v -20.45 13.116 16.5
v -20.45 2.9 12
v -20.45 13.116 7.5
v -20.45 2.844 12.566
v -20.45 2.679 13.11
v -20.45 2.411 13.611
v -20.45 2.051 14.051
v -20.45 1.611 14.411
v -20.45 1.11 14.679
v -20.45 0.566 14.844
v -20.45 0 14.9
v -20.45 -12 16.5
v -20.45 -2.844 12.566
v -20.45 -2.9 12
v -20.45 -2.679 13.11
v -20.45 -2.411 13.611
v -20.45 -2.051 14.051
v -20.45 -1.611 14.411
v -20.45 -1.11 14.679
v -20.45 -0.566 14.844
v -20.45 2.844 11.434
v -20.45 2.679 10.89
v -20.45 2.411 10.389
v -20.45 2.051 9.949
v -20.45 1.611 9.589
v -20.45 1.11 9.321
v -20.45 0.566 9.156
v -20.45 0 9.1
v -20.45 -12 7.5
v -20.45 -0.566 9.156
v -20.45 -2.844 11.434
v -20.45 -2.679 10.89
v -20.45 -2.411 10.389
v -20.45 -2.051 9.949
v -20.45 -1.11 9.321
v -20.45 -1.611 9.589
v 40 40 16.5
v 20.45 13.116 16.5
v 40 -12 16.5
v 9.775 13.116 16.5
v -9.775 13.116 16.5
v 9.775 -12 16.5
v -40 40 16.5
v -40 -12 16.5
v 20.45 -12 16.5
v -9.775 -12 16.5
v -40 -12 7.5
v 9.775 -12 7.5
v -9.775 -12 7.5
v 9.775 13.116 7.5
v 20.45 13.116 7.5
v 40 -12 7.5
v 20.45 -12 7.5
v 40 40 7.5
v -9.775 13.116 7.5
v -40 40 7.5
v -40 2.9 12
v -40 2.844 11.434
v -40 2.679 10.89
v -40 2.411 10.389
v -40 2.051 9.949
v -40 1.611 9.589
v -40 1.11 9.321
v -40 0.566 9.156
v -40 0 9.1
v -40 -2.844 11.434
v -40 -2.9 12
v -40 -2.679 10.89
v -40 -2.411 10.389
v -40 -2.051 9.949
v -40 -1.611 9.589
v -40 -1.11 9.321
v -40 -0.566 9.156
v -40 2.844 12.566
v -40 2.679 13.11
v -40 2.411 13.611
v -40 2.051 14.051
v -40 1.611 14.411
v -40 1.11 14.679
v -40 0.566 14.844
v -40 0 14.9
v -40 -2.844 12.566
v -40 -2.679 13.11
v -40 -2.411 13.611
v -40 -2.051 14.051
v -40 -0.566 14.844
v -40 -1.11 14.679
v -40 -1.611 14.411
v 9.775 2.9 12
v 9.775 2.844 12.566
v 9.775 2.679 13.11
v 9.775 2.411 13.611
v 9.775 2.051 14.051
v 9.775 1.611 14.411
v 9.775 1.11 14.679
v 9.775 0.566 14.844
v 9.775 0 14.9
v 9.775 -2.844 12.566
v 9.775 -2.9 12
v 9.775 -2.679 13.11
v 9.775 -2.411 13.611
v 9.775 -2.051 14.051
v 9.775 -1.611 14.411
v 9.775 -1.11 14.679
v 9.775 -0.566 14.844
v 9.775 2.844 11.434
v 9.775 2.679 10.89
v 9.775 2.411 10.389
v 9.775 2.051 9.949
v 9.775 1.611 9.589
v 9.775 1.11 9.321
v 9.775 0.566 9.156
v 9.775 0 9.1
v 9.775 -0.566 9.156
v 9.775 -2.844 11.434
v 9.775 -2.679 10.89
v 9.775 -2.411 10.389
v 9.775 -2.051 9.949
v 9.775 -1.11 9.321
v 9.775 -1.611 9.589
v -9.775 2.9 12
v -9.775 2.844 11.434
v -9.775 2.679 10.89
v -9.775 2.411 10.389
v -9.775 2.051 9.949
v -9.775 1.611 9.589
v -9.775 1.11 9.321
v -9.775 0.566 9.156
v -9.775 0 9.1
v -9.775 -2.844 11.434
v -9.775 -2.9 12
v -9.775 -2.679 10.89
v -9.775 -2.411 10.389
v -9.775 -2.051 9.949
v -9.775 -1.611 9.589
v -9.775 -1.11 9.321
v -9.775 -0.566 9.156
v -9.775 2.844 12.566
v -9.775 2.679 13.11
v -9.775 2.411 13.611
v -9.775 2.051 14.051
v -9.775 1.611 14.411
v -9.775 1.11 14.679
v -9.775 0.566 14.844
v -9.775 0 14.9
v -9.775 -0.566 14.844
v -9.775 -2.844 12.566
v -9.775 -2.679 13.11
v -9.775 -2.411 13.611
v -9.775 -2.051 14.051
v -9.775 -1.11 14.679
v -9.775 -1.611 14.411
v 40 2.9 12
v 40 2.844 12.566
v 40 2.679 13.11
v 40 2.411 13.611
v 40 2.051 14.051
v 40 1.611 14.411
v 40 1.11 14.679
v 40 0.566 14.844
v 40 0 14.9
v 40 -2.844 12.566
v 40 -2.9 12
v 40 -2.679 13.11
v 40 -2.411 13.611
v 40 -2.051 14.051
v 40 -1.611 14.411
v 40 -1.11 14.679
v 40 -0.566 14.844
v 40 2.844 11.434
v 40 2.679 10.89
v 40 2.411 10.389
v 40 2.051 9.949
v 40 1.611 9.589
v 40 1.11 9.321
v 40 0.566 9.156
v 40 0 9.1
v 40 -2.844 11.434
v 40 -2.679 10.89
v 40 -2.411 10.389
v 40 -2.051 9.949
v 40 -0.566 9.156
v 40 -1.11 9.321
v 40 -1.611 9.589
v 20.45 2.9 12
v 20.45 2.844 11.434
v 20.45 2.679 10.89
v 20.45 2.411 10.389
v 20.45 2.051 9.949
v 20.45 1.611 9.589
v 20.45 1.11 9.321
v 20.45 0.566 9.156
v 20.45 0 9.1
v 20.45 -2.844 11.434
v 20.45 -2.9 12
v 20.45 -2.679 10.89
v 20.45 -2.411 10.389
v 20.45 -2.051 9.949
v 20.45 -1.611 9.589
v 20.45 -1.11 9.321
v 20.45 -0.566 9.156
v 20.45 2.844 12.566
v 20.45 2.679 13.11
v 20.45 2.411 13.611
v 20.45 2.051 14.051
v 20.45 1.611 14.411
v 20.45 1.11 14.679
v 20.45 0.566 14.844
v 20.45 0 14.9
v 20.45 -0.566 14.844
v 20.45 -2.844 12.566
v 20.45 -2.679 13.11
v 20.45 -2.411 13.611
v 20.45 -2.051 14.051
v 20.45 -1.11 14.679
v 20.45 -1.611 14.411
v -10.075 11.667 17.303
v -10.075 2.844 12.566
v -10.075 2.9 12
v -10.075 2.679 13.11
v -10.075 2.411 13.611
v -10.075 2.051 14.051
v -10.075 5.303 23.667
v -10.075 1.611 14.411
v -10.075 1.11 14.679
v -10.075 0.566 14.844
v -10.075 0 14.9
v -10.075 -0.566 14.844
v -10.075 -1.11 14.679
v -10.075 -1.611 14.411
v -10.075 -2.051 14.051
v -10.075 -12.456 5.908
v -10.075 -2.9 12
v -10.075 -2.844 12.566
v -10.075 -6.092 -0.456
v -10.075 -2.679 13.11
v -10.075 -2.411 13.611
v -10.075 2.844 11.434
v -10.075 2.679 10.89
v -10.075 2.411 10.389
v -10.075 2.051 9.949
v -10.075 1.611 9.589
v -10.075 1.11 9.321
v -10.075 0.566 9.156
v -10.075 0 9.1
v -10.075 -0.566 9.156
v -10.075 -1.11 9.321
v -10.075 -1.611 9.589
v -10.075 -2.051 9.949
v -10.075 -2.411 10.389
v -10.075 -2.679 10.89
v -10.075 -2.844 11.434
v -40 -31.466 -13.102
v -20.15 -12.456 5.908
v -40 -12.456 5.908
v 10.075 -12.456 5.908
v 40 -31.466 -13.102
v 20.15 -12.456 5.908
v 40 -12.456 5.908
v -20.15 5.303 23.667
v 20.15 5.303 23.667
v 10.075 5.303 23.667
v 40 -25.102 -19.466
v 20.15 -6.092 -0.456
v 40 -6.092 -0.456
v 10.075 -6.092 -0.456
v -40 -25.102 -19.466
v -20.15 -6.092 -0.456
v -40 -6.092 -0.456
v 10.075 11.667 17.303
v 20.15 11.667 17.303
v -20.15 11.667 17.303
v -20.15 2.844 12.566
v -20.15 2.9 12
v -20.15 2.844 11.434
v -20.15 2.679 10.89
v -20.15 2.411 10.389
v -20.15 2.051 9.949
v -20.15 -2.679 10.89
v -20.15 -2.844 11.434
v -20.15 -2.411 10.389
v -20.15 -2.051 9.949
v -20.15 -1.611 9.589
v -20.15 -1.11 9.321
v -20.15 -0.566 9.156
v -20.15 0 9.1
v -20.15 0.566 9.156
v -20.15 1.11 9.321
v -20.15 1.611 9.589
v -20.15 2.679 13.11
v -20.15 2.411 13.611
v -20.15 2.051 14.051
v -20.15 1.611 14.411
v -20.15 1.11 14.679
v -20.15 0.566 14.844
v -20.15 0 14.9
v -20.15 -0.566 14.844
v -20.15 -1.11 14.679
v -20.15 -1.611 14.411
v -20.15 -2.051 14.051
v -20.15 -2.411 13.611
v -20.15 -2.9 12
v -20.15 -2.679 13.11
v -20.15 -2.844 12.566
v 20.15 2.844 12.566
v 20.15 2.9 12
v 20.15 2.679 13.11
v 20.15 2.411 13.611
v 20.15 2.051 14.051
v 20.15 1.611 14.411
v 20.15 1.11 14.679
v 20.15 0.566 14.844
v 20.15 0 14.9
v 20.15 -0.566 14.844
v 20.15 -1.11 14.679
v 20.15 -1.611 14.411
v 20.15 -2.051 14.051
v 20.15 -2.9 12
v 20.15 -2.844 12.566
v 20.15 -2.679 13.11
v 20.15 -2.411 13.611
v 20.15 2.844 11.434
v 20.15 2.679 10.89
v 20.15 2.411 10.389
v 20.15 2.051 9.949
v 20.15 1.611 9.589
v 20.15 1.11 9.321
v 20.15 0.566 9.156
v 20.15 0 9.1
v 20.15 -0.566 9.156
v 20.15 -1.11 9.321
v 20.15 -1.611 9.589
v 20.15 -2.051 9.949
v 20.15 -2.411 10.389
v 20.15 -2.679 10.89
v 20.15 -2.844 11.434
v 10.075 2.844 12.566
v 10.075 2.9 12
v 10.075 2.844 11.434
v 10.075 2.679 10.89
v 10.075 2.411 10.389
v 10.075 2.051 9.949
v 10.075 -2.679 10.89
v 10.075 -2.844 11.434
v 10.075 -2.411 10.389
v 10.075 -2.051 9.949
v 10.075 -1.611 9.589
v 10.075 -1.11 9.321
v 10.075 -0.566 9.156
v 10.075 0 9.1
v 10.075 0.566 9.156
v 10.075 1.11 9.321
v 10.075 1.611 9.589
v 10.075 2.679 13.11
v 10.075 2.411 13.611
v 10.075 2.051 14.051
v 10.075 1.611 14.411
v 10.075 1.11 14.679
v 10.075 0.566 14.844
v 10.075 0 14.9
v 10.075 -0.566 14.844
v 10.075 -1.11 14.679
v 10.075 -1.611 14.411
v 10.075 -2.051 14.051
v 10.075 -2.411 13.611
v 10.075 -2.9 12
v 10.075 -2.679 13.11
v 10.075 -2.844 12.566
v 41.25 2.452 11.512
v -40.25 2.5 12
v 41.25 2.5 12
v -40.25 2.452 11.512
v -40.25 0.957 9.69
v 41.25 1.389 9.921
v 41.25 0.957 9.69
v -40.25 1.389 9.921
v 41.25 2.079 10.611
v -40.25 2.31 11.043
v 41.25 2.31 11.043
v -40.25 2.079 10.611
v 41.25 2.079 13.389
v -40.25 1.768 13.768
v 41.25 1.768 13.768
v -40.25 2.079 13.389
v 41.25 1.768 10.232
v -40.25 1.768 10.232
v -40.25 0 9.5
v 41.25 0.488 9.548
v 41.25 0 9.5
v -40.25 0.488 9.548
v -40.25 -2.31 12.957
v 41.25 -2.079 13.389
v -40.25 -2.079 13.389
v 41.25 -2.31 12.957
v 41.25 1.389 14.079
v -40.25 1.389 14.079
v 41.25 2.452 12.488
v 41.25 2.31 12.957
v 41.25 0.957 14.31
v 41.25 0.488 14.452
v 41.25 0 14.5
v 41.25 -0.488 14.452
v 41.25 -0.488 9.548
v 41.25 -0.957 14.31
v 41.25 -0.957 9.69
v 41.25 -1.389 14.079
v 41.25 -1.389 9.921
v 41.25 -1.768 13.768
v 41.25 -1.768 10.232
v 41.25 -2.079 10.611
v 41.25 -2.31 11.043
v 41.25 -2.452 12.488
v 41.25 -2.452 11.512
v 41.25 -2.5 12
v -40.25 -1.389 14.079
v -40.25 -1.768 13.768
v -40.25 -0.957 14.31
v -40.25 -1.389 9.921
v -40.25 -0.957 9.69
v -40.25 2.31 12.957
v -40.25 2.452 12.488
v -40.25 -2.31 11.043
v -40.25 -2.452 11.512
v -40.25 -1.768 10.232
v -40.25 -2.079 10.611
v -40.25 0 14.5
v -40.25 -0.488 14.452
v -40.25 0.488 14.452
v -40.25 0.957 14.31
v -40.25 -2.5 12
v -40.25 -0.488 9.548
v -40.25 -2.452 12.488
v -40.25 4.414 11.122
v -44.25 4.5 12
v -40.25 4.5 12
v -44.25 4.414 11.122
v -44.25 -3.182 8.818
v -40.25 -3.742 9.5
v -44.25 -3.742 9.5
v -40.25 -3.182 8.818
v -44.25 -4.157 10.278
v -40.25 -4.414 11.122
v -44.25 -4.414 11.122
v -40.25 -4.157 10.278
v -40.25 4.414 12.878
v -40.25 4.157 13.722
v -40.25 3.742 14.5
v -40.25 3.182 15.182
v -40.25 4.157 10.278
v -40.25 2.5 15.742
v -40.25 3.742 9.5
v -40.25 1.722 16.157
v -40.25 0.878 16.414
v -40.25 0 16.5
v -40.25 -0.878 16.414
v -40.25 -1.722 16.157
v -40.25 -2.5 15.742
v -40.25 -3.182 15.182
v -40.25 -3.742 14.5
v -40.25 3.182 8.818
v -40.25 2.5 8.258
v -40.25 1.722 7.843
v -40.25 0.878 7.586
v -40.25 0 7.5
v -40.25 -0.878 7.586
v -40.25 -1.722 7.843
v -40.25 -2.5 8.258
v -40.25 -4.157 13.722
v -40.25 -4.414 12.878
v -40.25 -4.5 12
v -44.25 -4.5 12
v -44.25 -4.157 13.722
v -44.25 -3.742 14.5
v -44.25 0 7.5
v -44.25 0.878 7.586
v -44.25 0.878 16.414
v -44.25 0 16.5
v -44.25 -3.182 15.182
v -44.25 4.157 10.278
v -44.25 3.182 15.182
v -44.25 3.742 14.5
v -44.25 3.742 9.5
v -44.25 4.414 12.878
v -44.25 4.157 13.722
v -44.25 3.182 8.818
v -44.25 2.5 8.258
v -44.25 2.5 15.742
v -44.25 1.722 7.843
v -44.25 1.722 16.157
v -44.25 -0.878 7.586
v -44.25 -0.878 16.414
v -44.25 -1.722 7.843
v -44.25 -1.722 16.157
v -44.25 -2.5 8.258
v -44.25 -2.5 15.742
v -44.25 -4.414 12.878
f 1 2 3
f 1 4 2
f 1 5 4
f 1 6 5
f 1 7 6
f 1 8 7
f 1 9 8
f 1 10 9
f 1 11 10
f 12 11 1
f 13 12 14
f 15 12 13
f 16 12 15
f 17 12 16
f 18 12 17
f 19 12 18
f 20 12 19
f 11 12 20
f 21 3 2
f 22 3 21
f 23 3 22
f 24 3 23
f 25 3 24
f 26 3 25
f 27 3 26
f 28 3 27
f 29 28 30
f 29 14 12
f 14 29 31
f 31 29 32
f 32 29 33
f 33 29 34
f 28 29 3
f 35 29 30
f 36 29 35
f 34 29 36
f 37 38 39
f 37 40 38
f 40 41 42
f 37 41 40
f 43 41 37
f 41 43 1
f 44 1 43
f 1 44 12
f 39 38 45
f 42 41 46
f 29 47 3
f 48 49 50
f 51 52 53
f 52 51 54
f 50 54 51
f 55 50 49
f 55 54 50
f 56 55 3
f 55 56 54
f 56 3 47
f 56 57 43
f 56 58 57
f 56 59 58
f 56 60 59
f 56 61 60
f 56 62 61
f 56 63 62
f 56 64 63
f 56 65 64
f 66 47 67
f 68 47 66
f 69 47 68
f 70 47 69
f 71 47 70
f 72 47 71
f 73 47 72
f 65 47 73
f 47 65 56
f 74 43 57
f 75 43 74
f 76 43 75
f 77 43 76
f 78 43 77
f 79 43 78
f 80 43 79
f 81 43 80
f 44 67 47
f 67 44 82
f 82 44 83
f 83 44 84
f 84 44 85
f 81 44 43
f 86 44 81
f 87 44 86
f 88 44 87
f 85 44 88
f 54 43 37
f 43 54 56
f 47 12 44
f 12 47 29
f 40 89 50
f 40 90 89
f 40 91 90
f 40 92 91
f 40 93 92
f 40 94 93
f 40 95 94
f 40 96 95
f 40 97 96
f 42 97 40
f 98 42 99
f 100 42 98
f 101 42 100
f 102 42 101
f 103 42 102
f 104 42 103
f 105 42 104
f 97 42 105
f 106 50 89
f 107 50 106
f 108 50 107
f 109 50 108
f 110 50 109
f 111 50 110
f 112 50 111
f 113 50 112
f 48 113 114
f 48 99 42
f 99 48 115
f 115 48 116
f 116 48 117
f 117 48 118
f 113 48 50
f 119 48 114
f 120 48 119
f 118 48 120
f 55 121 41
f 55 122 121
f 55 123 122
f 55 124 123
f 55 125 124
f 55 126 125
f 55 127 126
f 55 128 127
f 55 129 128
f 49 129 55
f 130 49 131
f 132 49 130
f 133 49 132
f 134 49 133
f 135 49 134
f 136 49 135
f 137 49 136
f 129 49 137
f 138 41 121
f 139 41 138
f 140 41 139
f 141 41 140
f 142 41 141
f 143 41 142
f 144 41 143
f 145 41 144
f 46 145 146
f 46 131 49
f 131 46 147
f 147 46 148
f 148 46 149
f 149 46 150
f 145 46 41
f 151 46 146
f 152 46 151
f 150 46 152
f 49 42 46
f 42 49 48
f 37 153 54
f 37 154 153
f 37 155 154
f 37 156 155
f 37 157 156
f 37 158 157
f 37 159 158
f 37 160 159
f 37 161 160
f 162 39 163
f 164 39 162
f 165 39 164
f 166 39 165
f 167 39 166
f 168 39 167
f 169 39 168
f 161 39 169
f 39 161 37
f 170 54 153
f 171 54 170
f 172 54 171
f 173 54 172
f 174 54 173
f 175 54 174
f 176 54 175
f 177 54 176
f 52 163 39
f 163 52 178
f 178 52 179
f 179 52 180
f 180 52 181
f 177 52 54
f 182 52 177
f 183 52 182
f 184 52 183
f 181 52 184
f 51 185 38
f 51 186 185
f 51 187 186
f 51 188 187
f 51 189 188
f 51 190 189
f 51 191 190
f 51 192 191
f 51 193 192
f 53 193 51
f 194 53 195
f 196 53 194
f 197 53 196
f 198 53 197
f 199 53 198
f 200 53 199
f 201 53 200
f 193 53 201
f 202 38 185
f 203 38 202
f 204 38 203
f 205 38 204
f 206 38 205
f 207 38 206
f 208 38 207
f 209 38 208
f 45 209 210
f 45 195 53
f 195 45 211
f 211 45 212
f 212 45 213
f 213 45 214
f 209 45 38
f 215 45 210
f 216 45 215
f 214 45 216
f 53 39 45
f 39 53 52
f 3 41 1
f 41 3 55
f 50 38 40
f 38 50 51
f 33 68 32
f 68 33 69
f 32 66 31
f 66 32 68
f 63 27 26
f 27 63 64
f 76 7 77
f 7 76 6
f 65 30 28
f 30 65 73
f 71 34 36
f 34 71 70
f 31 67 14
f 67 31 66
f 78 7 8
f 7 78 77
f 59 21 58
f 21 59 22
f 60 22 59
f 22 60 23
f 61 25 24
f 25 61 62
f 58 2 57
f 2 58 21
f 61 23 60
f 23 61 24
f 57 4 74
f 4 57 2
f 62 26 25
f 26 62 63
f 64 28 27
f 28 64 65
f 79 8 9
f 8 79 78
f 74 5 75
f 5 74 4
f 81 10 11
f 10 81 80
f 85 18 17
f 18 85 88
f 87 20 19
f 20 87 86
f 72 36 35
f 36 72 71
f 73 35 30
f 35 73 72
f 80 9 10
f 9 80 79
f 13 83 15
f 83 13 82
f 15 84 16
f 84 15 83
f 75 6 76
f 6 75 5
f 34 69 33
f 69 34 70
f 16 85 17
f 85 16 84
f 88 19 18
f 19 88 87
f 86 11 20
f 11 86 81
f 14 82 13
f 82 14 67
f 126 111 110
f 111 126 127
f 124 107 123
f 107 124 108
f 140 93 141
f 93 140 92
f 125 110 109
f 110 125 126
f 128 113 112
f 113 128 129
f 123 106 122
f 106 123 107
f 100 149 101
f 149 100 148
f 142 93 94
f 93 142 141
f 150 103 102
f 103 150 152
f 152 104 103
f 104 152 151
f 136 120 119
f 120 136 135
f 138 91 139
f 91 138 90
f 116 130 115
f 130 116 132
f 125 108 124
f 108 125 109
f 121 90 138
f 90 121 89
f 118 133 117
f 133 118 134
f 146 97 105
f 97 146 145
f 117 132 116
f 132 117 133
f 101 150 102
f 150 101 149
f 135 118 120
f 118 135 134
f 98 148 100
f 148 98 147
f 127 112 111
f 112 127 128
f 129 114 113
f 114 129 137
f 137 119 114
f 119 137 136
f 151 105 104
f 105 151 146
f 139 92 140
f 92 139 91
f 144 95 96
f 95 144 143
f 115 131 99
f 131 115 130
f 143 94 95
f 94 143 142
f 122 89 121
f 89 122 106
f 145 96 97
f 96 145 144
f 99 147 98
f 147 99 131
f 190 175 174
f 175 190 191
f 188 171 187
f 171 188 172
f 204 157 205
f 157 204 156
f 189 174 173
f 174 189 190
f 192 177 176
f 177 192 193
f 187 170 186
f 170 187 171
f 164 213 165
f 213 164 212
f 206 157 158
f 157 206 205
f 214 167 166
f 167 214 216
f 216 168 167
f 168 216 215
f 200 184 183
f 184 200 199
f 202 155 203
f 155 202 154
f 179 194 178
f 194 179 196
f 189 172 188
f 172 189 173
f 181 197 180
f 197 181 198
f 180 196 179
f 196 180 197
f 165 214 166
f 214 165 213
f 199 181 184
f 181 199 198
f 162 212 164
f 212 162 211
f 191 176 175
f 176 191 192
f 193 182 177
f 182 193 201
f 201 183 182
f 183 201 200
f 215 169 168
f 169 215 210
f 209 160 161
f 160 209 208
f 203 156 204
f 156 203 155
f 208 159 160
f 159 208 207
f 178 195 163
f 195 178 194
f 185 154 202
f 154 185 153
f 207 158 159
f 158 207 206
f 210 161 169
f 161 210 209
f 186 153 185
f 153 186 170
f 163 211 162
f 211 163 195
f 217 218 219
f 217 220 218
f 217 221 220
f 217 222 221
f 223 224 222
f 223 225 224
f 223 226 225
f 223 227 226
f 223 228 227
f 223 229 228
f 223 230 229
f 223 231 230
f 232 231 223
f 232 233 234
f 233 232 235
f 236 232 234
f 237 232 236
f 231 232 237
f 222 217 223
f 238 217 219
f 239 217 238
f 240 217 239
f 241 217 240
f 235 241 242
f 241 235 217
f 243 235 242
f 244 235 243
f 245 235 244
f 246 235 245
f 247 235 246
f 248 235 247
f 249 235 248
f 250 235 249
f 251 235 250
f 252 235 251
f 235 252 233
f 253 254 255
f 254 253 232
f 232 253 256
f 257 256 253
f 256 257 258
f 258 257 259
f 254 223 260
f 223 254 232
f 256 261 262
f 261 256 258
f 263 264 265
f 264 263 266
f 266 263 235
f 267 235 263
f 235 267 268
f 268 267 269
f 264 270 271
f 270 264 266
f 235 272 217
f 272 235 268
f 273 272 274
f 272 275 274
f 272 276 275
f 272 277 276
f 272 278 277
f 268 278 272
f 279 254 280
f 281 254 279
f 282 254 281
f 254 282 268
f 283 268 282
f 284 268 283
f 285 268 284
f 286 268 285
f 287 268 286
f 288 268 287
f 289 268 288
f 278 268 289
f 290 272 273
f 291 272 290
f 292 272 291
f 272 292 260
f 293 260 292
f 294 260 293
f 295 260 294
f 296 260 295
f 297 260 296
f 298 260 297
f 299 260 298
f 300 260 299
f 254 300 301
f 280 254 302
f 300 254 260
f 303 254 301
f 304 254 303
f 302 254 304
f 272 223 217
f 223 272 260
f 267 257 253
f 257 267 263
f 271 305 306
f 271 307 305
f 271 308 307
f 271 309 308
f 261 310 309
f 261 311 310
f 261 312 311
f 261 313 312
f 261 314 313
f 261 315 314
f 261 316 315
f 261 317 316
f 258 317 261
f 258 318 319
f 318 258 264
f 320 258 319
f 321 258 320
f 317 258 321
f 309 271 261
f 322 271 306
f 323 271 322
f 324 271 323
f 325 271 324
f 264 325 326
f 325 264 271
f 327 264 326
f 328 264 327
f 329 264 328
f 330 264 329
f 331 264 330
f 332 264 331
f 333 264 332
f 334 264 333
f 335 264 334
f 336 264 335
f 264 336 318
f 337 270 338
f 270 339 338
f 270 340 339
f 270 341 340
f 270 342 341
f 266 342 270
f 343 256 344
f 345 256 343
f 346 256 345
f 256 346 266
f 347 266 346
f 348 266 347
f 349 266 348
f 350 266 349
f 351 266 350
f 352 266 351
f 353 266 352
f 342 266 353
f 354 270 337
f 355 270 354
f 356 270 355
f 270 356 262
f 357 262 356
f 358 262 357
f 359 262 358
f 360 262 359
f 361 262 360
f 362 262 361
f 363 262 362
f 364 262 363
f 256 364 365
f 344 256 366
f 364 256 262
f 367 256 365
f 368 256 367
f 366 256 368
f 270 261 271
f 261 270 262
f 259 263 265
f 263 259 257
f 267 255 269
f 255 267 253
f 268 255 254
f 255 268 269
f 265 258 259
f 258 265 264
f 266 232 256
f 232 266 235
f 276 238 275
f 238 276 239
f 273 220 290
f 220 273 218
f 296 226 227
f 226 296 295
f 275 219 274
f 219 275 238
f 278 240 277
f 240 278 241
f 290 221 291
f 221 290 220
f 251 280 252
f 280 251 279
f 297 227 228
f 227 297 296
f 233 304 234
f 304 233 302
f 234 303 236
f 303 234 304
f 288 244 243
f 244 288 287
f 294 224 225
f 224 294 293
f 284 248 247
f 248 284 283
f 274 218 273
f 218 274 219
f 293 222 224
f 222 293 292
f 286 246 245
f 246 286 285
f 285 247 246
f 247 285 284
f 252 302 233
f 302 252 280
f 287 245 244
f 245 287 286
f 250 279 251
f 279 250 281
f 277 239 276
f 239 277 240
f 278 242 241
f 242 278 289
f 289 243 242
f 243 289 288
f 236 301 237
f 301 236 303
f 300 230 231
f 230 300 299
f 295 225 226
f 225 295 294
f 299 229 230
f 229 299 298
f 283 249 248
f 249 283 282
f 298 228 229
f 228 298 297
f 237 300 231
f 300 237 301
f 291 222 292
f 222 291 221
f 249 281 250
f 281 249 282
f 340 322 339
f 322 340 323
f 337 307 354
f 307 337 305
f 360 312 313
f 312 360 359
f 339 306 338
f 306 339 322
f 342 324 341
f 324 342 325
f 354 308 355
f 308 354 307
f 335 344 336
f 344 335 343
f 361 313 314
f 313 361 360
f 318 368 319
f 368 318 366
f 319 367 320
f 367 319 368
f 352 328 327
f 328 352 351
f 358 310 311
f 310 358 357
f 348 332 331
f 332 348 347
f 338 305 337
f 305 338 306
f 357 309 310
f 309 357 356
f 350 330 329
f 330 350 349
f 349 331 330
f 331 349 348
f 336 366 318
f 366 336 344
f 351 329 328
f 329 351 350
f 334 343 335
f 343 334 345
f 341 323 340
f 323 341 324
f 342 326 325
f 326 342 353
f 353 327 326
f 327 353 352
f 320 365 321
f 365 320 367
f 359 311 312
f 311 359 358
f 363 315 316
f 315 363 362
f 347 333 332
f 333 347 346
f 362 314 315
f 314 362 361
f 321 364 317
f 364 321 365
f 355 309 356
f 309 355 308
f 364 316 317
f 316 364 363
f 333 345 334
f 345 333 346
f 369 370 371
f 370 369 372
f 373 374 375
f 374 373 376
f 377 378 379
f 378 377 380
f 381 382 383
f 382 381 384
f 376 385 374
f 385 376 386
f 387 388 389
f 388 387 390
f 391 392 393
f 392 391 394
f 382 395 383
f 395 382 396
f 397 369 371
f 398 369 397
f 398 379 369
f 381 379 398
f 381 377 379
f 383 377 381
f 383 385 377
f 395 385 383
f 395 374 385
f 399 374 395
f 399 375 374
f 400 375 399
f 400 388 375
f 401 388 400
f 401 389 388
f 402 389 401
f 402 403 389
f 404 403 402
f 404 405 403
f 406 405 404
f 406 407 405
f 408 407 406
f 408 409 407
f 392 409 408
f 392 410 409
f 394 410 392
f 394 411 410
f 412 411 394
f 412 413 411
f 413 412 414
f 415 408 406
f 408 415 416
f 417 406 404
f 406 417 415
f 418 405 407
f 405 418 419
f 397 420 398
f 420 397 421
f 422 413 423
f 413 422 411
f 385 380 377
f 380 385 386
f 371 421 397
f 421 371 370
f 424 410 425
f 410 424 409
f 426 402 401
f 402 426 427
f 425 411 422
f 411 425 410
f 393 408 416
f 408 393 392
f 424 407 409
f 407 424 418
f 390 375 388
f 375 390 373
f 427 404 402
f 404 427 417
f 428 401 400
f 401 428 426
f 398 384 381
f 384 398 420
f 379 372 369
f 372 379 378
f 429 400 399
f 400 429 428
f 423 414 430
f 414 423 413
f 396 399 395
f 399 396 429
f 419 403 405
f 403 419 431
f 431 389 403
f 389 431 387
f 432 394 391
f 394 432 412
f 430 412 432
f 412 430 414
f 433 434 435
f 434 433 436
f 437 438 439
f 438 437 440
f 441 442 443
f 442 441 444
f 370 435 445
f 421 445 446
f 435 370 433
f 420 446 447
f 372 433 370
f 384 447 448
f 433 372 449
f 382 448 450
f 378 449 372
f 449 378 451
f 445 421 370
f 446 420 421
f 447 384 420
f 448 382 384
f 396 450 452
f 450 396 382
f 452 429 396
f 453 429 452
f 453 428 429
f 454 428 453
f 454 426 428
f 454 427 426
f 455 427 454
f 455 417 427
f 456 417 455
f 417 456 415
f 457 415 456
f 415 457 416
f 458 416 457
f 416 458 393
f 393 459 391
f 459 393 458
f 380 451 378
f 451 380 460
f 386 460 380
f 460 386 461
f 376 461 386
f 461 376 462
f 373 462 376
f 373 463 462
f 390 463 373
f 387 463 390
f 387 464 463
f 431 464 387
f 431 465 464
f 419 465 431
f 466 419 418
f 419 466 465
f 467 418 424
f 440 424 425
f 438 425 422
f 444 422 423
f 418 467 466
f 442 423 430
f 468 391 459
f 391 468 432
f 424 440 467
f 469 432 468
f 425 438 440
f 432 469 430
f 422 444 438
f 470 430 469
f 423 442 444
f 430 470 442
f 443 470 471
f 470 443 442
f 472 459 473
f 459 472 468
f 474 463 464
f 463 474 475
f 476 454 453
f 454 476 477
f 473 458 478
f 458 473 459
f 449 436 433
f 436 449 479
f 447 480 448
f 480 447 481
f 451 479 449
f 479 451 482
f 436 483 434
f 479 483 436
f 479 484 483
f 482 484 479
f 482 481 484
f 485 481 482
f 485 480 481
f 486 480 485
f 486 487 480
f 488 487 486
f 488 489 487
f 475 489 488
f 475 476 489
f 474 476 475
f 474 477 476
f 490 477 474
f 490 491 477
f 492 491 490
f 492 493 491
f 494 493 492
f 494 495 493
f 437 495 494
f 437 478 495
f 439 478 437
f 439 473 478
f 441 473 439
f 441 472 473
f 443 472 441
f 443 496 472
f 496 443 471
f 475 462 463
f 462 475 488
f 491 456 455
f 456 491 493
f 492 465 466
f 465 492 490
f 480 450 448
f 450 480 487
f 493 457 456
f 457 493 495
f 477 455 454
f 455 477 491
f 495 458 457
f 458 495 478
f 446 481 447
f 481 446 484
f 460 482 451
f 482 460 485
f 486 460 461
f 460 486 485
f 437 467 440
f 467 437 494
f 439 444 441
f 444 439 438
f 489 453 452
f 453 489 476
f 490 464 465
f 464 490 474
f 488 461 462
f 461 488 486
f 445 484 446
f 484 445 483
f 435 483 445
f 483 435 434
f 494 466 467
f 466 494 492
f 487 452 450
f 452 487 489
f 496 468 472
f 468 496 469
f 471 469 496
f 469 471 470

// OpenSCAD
$fn = 32;

// ------------------------------------------------------------------------
// Butt hinge: hinge 80 mm, leaf swung 45 deg
// Every part is its own module, assembly() places every instance.
// ------------------------------------------------------------------------

// --- part 1 ---
module hinge_base() {
  difference() {
    union() {
      translate([-40, -12, -4.5]) cube([19.55, 52, 9]);
      translate([-9.775, -12, -4.5]) cube([19.55, 52, 9]);
      translate([20.45, -12, -4.5]) cube([19.55, 52, 9]);
      translate([-40, 13.116, -4.5]) cube([80, 26.884, 9]);
    }
    translate([-30.225, 0, 0]) rotate([0, 90, 0]) cylinder(h = 21.55, d = 5.8, center = true);
    translate([0, 0, 0]) rotate([0, 90, 0]) cylinder(h = 21.55, d = 5.8, center = true);
    translate([30.225, 0, 0]) rotate([0, 90, 0]) cylinder(h = 21.55, d = 5.8, center = true);
  }
}

// --- part 2 ---
module hinge_mover() {
  difference() {
    union() {
      translate([-20.15, -40, -4.5]) cube([10.075, 52, 9]);
      translate([10.075, -40, -4.5]) cube([10.075, 52, 9]);
      translate([-40, -40, -4.5]) cube([80, 26.884, 9]);
    }
    translate([-15.113, 0, 0]) rotate([0, 90, 0]) cylinder(h = 12.075, d = 5.8, center = true);
    translate([15.113, 0, 0]) rotate([0, 90, 0]) cylinder(h = 12.075, d = 5.8, center = true);
  }
}

// --- part 3 ---
module hinge_pin() {
  rotate([0, 90, 0]) cylinder(h = 82.5, d = 5, center = true);
  translate([-44.25, 0, 0]) rotate([0, 90, 0]) cylinder(h = 4, d = 9);
}

// --- assembly ---
module assembly() {
  color([0.80, 0.24, 0.20]) translate([0, 0, 12]) rotate([0, 0, 0]) hinge_base();
  color([0.20, 0.45, 0.75]) translate([0, 0, 12]) rotate([45, 0, 0]) hinge_mover();
  color([0.25, 0.62, 0.32]) translate([0, 0, 12]) rotate([0, 0, 0]) hinge_pin();
}

assembly();
